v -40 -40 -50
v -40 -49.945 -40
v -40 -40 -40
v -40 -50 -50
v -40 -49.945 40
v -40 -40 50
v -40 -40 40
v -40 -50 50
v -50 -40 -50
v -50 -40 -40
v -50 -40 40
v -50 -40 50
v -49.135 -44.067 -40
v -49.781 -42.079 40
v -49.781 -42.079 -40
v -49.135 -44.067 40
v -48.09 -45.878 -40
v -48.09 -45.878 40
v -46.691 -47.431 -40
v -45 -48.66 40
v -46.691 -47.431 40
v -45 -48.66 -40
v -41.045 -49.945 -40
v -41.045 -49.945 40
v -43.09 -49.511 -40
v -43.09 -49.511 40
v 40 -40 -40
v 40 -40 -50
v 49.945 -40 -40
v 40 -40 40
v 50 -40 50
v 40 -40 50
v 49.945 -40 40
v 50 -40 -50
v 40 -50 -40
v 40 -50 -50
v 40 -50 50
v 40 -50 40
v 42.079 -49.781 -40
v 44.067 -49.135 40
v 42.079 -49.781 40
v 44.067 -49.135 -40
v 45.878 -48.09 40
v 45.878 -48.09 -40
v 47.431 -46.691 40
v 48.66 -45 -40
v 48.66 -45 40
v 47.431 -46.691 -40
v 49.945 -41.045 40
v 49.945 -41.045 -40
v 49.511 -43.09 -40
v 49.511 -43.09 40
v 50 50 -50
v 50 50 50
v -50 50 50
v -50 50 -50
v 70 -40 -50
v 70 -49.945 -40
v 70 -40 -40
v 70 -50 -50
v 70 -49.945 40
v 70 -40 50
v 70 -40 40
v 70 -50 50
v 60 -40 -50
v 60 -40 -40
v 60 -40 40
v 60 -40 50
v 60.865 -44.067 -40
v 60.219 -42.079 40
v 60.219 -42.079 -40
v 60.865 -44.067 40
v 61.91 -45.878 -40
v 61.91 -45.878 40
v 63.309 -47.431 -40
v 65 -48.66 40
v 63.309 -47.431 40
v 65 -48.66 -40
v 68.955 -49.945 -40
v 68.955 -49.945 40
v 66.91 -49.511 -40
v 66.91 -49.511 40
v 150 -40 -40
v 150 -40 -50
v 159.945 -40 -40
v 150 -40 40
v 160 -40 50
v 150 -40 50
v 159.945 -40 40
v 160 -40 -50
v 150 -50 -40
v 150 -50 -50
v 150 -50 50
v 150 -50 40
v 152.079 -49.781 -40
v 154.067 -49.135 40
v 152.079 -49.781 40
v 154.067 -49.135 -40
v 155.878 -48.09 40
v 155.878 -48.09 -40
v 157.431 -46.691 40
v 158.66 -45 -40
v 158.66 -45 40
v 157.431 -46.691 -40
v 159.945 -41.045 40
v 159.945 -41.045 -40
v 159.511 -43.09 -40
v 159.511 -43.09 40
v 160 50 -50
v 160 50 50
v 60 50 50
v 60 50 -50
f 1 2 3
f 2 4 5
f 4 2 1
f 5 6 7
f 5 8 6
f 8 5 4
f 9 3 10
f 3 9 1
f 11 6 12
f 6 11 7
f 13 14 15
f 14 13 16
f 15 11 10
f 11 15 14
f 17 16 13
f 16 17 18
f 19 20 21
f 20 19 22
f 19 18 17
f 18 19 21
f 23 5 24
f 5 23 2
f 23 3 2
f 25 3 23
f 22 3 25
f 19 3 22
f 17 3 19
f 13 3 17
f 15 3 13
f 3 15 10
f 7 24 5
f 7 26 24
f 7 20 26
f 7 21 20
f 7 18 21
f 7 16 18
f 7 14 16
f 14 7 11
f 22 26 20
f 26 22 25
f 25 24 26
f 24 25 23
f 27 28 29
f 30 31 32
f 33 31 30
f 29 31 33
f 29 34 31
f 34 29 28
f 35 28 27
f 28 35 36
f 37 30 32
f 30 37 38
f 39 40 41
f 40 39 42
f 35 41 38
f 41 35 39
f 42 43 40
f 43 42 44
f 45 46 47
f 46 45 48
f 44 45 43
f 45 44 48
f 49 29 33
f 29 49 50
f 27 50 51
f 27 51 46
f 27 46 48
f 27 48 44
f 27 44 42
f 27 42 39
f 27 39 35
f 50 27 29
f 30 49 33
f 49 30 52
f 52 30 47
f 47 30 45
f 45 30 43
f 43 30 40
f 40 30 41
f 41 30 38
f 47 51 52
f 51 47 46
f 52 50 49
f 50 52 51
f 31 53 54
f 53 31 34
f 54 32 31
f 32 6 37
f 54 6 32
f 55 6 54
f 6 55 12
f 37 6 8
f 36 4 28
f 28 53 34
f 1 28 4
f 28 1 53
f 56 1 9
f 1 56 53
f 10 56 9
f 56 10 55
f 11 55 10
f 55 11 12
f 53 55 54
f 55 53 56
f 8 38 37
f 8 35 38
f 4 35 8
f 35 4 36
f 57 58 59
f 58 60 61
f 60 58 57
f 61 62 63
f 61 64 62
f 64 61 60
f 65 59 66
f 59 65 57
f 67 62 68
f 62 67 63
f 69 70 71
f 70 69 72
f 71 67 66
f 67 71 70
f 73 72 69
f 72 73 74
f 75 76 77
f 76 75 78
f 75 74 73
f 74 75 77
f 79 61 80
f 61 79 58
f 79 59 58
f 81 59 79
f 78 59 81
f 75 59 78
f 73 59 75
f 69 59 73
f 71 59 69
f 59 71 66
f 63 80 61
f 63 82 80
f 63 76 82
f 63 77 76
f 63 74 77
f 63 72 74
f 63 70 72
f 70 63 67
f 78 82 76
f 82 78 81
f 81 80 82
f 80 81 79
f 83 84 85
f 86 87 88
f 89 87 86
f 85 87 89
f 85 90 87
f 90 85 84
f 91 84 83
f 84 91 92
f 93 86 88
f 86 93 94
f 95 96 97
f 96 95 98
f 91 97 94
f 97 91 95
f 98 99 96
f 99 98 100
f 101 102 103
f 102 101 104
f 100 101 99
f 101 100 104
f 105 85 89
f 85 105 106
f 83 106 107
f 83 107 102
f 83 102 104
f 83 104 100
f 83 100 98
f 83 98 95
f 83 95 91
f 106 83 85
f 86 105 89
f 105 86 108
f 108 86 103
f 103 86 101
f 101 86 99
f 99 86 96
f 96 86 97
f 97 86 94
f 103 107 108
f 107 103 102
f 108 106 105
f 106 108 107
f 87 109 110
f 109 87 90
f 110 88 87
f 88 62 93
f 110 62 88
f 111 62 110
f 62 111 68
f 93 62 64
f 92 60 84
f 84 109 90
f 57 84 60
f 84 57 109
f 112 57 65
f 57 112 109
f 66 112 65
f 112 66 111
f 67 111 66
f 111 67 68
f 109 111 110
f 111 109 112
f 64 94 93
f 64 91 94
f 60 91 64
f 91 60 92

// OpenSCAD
module edgeprofile()
{
  difference() {
    cube([20, 20, 150], center = true);
    translate([-10, -10, 0]) cylinder(h = 80, r = 10, center = true);
  }
}

module rendered_edgeprofile()
{
  render(convexity = 2) edgeprofile();
}

module mycube() {
  difference() {
    cube(100, center = true);
    translate([ -50, -50, 0 ]) rotate(180, [0, 0, 1]) edgeprofile();
    translate([ 50, -50, 0 ]) rotate(270, [0, 0, 1]) edgeprofile();
  }
}

module rendered_mycube() {
  difference() {
    cube(100, center = true);
    translate([ -50, -50, 0 ]) rotate(180, [0, 0, 1]) rendered_edgeprofile();
    translate([ 50, -50, 0 ]) rotate(270, [0, 0, 1]) rendered_edgeprofile();
  }
}

mycube();
translate([110,0,0]) rendered_mycube();
